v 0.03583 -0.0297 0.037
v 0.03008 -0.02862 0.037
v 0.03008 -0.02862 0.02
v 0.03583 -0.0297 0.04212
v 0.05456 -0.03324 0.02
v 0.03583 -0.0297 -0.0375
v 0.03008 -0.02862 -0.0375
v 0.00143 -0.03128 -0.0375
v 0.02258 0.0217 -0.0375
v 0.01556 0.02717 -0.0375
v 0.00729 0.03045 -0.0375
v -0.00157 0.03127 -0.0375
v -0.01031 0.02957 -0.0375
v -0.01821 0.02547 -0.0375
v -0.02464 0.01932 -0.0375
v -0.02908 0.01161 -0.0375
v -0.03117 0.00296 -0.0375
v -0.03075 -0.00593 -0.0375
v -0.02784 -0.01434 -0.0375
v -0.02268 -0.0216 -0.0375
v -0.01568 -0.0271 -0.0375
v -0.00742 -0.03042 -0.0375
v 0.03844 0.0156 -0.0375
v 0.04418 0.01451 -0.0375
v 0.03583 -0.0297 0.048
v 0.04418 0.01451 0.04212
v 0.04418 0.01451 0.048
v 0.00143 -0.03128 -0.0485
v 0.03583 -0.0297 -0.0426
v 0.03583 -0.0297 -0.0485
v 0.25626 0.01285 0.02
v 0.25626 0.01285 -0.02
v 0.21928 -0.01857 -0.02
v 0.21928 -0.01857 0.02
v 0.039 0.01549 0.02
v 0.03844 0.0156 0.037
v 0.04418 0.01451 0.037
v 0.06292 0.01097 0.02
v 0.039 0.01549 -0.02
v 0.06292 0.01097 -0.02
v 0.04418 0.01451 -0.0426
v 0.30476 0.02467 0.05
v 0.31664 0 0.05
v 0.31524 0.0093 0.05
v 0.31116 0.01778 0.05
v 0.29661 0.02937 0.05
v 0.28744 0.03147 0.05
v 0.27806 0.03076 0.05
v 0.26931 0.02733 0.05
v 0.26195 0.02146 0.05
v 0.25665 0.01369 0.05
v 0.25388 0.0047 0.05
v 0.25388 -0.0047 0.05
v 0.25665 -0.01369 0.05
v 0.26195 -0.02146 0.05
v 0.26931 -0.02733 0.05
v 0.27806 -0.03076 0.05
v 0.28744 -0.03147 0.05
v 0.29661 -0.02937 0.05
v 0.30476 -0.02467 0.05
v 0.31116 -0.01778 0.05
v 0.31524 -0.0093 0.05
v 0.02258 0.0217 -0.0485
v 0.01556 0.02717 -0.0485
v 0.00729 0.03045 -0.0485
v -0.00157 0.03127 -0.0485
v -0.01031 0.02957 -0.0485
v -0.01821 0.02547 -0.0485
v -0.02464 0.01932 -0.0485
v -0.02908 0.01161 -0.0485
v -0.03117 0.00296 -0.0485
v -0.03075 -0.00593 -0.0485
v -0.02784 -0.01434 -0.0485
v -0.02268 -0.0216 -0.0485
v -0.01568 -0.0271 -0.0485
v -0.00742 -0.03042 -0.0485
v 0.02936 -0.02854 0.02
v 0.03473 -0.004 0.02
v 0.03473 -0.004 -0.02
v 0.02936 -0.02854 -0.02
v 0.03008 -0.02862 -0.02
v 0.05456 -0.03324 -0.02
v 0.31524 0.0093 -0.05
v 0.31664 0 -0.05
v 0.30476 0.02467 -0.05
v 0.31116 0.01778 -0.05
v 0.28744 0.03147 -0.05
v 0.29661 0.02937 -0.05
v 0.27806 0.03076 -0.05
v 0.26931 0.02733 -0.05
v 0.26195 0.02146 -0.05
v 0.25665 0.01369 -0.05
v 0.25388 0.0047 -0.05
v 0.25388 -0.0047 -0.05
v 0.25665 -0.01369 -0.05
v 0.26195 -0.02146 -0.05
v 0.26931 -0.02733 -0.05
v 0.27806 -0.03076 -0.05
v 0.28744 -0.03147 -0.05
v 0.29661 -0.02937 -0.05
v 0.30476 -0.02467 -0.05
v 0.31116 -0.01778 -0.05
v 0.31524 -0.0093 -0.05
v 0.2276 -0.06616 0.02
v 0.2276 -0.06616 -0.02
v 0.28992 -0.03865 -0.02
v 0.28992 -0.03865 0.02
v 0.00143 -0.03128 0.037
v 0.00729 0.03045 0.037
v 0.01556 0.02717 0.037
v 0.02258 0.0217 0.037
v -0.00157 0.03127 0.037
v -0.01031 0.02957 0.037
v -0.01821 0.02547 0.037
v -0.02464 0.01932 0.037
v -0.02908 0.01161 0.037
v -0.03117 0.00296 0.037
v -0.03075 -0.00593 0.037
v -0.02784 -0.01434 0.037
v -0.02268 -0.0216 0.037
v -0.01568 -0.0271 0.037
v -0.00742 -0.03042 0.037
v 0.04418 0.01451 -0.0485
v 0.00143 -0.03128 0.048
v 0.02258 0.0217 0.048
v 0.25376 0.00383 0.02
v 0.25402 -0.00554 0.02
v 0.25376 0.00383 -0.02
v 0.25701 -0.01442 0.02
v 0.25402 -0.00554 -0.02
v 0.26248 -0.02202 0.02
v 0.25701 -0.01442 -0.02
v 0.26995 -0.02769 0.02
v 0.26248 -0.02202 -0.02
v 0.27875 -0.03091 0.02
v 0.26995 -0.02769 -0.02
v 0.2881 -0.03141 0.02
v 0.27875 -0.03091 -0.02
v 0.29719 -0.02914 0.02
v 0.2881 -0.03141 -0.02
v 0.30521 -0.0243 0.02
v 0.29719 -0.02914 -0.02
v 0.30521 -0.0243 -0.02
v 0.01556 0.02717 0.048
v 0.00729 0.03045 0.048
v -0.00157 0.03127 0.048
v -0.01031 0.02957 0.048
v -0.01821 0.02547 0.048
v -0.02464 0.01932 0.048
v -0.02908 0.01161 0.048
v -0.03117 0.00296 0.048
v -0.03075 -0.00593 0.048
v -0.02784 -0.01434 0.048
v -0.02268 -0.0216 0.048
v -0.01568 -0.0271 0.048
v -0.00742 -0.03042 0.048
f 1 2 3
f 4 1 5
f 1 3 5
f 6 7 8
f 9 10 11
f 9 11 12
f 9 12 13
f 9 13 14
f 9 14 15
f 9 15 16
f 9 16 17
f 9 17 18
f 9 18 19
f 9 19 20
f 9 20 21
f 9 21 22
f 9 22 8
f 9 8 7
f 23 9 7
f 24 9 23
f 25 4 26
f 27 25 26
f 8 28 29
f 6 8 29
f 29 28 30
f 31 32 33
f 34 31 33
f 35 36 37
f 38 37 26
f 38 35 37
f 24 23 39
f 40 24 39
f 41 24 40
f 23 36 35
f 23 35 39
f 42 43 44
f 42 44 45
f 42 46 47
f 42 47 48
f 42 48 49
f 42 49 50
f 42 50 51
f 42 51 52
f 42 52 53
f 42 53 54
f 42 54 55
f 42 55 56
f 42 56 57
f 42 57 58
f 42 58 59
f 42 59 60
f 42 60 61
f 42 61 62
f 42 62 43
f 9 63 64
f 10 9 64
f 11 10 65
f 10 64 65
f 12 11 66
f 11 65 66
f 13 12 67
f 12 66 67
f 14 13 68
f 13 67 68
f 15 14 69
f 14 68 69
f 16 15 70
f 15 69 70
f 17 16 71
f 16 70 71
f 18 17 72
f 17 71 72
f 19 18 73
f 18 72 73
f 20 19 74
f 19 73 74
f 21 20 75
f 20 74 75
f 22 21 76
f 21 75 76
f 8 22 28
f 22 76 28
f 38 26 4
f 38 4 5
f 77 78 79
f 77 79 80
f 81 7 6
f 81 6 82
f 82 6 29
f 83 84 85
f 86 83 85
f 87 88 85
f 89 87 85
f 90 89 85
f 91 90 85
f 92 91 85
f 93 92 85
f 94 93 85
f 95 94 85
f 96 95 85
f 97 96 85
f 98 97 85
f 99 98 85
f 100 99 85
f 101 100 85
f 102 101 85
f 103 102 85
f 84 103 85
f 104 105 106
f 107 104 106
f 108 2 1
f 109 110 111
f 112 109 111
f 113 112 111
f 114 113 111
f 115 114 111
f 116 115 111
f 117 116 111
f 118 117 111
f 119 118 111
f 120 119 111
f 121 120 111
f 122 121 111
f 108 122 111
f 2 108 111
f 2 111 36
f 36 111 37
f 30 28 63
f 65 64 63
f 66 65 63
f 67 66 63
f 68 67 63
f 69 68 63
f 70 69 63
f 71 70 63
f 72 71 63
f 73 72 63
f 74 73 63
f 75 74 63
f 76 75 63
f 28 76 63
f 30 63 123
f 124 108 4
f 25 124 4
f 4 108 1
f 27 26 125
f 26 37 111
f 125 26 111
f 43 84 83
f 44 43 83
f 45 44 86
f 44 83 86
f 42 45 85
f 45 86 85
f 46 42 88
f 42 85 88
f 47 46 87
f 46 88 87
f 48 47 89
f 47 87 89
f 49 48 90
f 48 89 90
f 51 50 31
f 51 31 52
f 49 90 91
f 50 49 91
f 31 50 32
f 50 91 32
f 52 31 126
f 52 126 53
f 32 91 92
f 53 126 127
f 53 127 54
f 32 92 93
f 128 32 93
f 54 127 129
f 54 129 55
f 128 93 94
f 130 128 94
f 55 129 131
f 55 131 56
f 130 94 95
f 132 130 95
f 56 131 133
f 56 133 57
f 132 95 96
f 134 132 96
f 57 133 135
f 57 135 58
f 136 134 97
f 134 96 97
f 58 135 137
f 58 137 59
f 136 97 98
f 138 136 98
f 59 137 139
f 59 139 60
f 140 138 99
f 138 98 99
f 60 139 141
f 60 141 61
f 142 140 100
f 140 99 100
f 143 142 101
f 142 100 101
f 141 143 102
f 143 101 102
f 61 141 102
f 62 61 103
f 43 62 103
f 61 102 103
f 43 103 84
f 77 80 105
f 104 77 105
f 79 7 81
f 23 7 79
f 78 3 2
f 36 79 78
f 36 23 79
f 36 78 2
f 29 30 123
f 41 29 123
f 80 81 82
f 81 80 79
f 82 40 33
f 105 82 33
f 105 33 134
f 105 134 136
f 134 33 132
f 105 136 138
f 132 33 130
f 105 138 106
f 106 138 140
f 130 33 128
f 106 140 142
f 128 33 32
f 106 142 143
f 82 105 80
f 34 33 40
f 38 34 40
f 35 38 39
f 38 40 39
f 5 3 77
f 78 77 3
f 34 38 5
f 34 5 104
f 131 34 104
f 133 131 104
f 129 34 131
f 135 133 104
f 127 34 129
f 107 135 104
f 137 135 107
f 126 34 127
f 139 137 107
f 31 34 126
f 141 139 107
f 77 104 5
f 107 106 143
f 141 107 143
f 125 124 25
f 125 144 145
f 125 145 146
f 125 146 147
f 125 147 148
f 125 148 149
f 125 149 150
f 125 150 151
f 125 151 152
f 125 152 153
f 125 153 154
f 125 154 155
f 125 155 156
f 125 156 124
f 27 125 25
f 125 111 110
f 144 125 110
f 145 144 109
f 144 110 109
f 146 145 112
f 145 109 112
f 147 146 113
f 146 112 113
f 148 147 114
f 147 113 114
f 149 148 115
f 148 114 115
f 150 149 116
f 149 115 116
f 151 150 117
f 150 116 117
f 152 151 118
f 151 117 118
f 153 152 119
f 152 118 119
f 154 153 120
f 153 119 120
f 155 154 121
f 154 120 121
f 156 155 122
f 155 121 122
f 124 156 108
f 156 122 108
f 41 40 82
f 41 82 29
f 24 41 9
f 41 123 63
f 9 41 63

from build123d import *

# Parameters (mm, degrees)
BOSS_EXTRUDE1_DEPTH      = 0.05
BOSS_EXTRUDE1_DEPTH_BACK = 0.05
SKETCH1_R                = 0.031555485
BOSS_EXTRUDE2_DEPTH      = 0.02
BOSS_EXTRUDE2_DEPTH_BACK = 0.02
BOSS_EXTRUDE3_DEPTH      = 0.045
BOSS_EXTRUDE4_START      = 0.037
BOSS_EXTRUDE4_DEPTH      = 0.011
BOSS_EXTRUDE5_START      = -0.0485
BOSS_EXTRUDE5_DEPTH      = 0.011


with BuildPart() as part:
    # Sketch1 → Boss-Extrude1 (new, two sides: drawn at the far end of the back side and taken through both)
    with BuildSketch(Plane.XY.offset(-BOSS_EXTRUDE1_DEPTH_BACK)):
        with Locations((0.285082825, 0)):
            Circle(SKETCH1_R)
    extrude(amount=BOSS_EXTRUDE1_DEPTH + BOSS_EXTRUDE1_DEPTH_BACK)

    # Sketch2 → Boss-Extrude2 (add, two sides: drawn at the far end of the back side and taken through both)
    with BuildSketch(Plane.XY.offset(-BOSS_EXTRUDE2_DEPTH_BACK)):
        Polygon((0.256264101, 0.012854173), (0.219275504, -0.018570175), (0.038999203, 0.01549308), (0.029362086, -0.028537173), (0.227597753, -0.066155863), (0.28991637, -0.038647294), (0.305214712, -0.024299296), align=None)
    extrude(amount=BOSS_EXTRUDE2_DEPTH + BOSS_EXTRUDE2_DEPTH_BACK)

    # Sketch4 → Boss-Extrude3 (add)
    with BuildSketch(Plane(origin=(0.00417087, 0.022073903, 0), x_dir=(0.9826131004203594, -0.18566500715613823, 0), z_dir=(0.18566500715613823, 0.9826131004203594, 0))):
        Polygon((0.034871537, 0.042595926), (0.034871537, -0.042120531), (0.040720148, -0.042120531), (0.059784705, -0.02), (0.059784705, 0.02), (0.040720148, 0.042595926), align=None)
    extrude(amount=-BOSS_EXTRUDE3_DEPTH)

    # Sketch5 → Boss-Extrude4 (add)
    with BuildSketch(Plane.XY.offset(BOSS_EXTRUDE4_START)):
        with BuildLine():
            Line((0.001433832, -0.031280551), (0.035828096, -0.029703994))
            Line((0.035828096, -0.029703994), (0.044183021, 0.014513596))
            Line((0.044183021, 0.014513596), (0.022579642, 0.021695356))
            ThreePointArc((0.022579642, 0.021695356), (-0.029082184, 0.011608416), (0.001433832, -0.031280551))
        make_face()
    extrude(amount=BOSS_EXTRUDE4_DEPTH)

    # Sketch5<2> → Boss-Extrude5 (add)
    with BuildSketch(Plane.XY.offset(BOSS_EXTRUDE5_START)):
        with BuildLine():
            Line((0.001433832, -0.031280551), (0.035828096, -0.029703994))
            Line((0.035828096, -0.029703994), (0.044183021, 0.014513596))
            Line((0.044183021, 0.014513596), (0.022579642, 0.021695356))
            ThreePointArc((0.022579642, 0.021695356), (-0.029082184, 0.011608416), (0.001433832, -0.031280551))
        make_face()
    extrude(amount=BOSS_EXTRUDE5_DEPTH)


solid = part.part
